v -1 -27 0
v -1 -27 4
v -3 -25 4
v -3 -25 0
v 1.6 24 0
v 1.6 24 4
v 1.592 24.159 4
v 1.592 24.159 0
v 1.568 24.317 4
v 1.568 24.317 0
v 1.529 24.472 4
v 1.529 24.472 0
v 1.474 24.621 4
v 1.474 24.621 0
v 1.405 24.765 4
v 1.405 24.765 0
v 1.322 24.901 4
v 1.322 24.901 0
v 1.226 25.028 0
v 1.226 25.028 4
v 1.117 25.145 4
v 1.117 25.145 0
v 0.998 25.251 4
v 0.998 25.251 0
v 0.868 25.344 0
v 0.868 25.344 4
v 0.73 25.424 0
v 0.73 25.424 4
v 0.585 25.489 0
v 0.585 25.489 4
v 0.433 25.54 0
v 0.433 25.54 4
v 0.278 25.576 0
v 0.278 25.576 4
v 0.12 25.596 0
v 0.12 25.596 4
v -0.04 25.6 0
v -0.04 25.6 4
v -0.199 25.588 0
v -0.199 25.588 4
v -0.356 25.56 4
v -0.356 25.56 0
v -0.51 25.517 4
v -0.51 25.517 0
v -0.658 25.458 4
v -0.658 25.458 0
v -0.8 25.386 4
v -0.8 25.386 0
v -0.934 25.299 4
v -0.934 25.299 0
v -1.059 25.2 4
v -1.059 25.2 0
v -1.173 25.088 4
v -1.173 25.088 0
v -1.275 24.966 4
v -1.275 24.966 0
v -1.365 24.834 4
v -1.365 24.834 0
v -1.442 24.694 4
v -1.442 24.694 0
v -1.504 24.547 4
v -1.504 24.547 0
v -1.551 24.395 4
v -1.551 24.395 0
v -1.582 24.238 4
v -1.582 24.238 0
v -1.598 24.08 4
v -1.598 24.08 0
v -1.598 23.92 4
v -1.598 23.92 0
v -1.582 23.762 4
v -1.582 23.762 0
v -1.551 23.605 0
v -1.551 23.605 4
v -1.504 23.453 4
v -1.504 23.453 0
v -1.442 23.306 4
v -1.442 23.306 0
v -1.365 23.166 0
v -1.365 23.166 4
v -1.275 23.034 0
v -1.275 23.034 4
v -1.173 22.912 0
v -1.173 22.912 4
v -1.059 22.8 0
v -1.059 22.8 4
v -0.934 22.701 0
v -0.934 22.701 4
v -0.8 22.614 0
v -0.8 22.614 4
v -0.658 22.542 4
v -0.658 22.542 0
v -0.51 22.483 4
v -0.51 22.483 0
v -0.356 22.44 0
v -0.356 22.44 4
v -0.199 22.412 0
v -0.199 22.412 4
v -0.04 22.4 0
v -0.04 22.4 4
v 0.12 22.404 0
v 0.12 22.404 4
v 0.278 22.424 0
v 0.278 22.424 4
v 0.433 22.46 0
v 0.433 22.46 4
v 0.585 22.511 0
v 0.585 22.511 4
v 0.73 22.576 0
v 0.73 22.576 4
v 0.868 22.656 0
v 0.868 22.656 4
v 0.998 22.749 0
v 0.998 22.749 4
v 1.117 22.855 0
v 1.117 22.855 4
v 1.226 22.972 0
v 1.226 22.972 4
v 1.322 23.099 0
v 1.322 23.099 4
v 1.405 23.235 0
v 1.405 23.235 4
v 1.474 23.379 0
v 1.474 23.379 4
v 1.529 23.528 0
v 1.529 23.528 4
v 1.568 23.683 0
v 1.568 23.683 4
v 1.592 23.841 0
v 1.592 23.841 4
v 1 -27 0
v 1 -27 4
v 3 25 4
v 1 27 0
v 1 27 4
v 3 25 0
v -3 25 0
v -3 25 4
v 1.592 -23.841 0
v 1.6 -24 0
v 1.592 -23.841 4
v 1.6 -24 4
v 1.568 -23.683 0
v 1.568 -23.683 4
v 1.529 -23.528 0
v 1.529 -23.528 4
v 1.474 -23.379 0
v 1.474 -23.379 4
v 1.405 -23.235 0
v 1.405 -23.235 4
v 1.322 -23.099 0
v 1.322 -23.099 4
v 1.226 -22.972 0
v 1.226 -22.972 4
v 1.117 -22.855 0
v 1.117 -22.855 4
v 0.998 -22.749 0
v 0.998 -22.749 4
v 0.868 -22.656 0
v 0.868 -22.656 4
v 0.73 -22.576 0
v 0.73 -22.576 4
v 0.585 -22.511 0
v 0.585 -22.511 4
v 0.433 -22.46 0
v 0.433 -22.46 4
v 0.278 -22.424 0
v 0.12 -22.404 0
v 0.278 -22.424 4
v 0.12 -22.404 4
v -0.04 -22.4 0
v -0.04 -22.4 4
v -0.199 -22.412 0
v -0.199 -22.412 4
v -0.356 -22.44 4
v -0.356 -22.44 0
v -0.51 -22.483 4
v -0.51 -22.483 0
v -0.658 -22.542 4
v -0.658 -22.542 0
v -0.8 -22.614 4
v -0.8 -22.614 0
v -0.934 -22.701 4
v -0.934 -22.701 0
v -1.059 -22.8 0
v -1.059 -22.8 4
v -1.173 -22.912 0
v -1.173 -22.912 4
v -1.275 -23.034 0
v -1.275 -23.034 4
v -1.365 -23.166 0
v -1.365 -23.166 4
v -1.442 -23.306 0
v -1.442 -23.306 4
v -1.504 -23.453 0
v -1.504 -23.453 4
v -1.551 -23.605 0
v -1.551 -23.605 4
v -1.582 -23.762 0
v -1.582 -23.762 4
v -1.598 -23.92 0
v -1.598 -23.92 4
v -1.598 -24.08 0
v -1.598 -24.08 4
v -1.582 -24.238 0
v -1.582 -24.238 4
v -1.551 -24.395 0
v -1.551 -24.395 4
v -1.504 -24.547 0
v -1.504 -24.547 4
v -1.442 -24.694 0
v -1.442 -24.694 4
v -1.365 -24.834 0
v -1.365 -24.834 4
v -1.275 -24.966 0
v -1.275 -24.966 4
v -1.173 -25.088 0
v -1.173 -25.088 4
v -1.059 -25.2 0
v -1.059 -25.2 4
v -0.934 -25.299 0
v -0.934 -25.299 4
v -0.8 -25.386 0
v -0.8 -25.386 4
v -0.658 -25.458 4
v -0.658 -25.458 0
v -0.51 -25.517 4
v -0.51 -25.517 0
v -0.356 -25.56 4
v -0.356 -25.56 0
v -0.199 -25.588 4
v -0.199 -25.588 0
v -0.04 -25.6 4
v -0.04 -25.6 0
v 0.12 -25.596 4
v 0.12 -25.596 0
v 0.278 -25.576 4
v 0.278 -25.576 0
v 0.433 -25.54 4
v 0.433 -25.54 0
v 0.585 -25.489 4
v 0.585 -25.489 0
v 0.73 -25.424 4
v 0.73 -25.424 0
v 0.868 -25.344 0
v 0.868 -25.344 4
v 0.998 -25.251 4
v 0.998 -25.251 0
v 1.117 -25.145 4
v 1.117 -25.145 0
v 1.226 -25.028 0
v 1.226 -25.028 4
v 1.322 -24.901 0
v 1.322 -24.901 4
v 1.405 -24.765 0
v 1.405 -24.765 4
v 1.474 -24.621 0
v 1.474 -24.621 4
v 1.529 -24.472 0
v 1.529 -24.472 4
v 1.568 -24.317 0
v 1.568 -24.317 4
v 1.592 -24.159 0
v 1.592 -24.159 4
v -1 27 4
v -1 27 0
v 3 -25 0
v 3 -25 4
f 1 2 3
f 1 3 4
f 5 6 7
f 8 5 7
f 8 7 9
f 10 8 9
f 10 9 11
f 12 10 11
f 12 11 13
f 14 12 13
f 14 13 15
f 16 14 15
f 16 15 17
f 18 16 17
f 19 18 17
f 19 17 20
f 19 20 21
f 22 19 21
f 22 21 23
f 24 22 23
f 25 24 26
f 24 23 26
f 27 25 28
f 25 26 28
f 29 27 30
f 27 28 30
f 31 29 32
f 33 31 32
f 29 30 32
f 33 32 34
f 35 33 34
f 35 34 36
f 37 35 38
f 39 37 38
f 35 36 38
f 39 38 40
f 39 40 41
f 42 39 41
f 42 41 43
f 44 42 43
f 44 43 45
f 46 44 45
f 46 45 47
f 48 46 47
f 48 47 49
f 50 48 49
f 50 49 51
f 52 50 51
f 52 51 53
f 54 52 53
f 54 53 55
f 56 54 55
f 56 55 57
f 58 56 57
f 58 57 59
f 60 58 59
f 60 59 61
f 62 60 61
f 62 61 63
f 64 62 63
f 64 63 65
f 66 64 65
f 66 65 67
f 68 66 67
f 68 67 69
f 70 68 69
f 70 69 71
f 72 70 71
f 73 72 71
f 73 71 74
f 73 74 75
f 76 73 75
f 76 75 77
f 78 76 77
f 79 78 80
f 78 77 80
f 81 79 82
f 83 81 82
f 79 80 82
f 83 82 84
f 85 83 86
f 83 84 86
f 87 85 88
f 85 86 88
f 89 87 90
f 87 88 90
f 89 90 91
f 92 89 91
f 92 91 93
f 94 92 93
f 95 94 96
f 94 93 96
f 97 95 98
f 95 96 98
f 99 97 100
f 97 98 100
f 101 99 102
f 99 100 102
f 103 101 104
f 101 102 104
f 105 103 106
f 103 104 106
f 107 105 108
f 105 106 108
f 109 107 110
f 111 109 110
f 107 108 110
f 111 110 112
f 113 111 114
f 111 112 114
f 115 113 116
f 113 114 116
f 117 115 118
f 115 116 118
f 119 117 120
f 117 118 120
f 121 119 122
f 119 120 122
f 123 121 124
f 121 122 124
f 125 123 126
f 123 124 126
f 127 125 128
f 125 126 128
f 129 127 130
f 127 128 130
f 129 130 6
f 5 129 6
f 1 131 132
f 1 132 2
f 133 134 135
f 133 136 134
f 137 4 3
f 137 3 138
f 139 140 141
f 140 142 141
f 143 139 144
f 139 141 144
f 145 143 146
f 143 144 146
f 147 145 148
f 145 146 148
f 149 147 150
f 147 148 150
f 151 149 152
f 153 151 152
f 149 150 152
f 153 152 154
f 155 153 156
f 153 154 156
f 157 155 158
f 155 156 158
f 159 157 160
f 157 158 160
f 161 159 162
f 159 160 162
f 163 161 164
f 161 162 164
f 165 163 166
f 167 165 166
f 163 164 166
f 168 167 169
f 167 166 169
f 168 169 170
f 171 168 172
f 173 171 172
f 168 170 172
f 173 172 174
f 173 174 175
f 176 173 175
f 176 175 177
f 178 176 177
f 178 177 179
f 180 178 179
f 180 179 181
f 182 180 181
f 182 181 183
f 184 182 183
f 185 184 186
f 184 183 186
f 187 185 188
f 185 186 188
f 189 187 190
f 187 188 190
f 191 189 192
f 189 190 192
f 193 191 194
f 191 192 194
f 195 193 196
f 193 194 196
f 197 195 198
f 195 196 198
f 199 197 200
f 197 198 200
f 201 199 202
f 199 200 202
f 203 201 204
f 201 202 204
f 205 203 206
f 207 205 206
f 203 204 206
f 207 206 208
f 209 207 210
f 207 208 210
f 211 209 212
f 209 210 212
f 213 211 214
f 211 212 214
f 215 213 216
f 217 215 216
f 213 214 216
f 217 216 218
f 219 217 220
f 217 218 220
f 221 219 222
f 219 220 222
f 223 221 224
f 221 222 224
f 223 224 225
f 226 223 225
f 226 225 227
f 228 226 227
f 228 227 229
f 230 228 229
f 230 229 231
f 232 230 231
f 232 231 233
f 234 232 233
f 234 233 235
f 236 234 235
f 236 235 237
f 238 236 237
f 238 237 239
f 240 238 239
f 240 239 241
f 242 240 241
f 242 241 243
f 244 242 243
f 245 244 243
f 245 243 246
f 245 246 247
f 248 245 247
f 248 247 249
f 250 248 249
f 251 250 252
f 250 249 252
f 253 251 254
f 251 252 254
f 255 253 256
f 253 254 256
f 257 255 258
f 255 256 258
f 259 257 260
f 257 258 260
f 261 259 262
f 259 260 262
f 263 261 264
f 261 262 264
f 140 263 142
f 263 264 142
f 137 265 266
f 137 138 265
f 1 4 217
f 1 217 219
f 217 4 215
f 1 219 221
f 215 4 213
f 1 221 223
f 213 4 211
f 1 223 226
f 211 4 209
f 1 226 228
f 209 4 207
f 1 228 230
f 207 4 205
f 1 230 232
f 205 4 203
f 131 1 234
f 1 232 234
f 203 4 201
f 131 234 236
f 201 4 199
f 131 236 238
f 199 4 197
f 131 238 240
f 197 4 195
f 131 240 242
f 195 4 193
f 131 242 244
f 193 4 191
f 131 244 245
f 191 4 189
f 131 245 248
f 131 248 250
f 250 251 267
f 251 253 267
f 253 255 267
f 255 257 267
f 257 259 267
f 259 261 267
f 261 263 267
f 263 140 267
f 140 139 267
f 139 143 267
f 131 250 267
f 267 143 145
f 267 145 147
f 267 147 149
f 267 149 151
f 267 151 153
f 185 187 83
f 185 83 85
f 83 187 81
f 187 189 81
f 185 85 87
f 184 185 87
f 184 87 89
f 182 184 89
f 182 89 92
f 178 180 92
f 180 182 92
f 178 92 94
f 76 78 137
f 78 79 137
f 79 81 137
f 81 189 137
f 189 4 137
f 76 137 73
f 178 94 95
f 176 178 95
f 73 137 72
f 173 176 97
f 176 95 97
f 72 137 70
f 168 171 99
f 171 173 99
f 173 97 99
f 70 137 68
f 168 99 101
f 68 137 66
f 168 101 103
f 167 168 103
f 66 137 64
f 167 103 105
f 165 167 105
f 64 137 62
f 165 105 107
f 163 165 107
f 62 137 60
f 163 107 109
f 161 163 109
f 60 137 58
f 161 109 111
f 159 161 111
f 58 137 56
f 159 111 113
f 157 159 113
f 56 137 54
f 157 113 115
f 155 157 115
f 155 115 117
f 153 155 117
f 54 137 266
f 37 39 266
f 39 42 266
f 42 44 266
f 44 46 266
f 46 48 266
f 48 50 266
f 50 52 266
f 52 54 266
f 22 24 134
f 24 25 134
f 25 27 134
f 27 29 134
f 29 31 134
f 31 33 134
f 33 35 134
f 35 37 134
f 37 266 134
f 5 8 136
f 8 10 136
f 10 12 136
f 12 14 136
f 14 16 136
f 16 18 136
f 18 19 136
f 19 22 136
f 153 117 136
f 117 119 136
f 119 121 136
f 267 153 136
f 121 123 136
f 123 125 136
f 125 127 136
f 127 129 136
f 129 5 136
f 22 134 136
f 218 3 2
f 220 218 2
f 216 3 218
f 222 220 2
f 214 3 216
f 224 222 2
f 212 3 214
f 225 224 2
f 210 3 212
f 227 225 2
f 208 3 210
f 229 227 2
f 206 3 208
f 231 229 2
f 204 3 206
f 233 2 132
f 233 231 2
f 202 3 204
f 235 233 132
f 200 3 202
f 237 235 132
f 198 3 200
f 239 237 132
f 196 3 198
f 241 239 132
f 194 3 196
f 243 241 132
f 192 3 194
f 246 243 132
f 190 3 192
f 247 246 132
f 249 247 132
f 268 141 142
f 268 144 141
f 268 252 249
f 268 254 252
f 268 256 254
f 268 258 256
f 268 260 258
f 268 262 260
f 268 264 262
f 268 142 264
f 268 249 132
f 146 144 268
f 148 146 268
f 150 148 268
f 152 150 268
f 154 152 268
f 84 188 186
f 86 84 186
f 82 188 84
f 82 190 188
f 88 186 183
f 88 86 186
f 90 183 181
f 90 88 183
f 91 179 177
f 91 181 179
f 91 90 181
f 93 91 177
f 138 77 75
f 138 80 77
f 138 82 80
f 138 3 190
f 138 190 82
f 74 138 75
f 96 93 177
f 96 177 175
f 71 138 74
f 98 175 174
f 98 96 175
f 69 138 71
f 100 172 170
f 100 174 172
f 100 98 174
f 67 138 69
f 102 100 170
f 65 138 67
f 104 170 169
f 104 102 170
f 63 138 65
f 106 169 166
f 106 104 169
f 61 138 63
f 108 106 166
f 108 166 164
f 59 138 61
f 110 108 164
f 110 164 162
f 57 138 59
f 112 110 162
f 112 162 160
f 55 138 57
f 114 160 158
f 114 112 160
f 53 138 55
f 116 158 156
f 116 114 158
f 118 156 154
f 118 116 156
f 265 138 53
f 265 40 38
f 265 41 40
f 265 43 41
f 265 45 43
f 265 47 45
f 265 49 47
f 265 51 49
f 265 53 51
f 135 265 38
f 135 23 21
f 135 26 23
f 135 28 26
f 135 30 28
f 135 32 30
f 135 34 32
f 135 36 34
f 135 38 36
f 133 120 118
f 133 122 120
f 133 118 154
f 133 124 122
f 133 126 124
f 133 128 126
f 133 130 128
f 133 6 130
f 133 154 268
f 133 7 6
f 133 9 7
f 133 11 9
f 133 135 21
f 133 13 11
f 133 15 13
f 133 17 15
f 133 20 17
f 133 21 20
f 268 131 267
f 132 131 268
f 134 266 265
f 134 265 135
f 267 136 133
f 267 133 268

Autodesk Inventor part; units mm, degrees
ref_plane "YZ Plane" through (0, 0, 0) normal (1, 0, 0) x (0, 1, 0)
ref_plane "XZ Plane" through (0, 0, 0) normal (0, 1, 0) x (-1, 0, 0)
ref_plane "XY Plane" through (0, 0, 0) normal (0, 0, 1) x (1, 0, 0)
sketch "스케치1" plane through (0, 0, 0) normal (0, 0, 1) x (1, 0, 0)
  line L0 (-3, 27) -> (3, 27)
  line L1 (3, 27) -> (3, -27)
  line L2 (3, -27) -> (-3, -27)
  line L3 (-3, -27) -> (-3, 27)
  point P0 (0, 0)
  dimension "d0" = 6
  dimension "d1" = 54
  dimension "d3" = 3
  dimension "d4" = 27
extrude "돌출1" add sketch "스케치1" along normal blind 4
sketch "스케치2" plane through (0, 0, 4) normal (0, 0, 1) x (1, 0, 0)
  line L0 (3, 27) -> (-3, 27) projected
  line L1 (-3, 27) -> (-3, -27) projected
  line L2 (-3, -27) -> (3, -27) projected
  line L3 (3, -27) -> (3, 27) projected
  circle A0 centre (0, 24) radius 1.6
  circle A1 centre (0, -24) radius 1.6
  point P0 (0, 0)
  dimension "d7" = 3.2
  dimension "d8" = 3.2
  dimension "d9" = 3
  dimension "d10" = 3
  dimension "d11" = 3
  dimension "d12" = 3
extrude "돌출2" cut sketch "스케치2" against normal up to next contours A0 | A1
chamfer "모따기1" distance 2 angle 45 4 edges at (3, 27, 2) (-3, 27, 2) (-3, -27, 2) (3, -27, 2)
equation "\"d4\" = 0.5 * d1"
properties part number "큰모터서포터" material "알루미늄 6061"
